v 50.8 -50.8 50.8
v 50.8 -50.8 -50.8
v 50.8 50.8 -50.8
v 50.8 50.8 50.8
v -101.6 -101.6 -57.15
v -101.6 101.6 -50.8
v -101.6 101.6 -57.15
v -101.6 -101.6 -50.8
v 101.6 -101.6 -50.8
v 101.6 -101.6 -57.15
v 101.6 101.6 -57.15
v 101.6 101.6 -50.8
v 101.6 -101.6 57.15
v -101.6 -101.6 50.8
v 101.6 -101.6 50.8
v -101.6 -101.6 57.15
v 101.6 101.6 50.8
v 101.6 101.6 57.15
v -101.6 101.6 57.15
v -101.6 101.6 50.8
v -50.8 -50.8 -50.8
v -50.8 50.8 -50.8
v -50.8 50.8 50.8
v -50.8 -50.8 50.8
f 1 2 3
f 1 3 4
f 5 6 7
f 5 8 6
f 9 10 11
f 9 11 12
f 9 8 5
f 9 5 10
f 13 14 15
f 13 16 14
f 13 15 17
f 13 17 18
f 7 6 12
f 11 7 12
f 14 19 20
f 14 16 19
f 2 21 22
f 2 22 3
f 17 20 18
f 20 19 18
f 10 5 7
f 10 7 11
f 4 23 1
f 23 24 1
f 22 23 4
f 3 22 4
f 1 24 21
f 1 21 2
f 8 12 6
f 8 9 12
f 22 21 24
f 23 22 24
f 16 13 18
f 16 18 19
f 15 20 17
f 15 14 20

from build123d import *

# Parameters (mm, degrees)
F1_DEPTH      = 101.6
F1_DEPTH_BACK = 101.6
F2_DEPTH      = 101.6
F2_DEPTH_BACK = 101.6
F0_W          = 101.6
F0_H          = 101.6
F3_DEPTH      = 50.8
F3_DEPTH_BACK = 50.8


with BuildPart() as f1:
    # F0 (on Front) → F1 (new body, two sides)
    with BuildSketch(Plane.XZ) as f1_sk:
        Polygon((-101.6, 50.8), (-50.8, 50.8), (50.8, 50.8), (101.6, 50.8), (101.6, 57.15), (-101.6, 57.15), align=None)
    extrude(amount=F1_DEPTH)
    extrude(f1_sk.sketch, amount=-F1_DEPTH_BACK)


with BuildPart() as f2:
    # F0 (on Front) → F2 (new body, two sides)
    with BuildSketch(Plane.XZ) as f2_sk:
        Polygon((50.8, -50.8), (-50.8, -50.8), (-101.6, -50.8), (-101.6, -57.15), (101.6, -57.15), (101.6, -50.8), align=None)
    extrude(amount=F2_DEPTH)
    extrude(f2_sk.sketch, amount=-F2_DEPTH_BACK)


with BuildPart() as f3:
    # F0 (on Front) → F3 (new body, two sides)
    with BuildSketch(Plane.XZ) as f3_sk:
        Rectangle(F0_W, F0_H)
    extrude(amount=F3_DEPTH)
    extrude(f3_sk.sketch, amount=-F3_DEPTH_BACK)


solid = Compound([f1.part, f2.part, f3.part])
